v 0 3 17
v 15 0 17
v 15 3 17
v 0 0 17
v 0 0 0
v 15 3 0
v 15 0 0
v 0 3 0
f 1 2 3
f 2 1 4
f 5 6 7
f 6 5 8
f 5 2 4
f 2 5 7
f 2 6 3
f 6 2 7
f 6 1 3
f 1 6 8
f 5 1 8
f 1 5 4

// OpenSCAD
// Generated by SolidPython 1.0.1 on 2020-07-29 00:46:55


cube(size = [15, 3, 17]);
/***********************************************
*********      SolidPython code:      **********
************************************************
 
# import packages: SolidPython
from solid import *
from solid.utils import *
from itertools import chain, combinations, permutations


class Resize:

    def __init__(self, scad_file):
        self.scad_file = scad_file
        #self.scad_file = import_scad(scad_file)
        # cone/cylinder param:
        self.r1 = 0
        self.r2 = 0
        self.h = 0
        # rectangular prism param:
        self.w = 0
        self.l = 0
        # ellipse param:
        self.r = 0

    # import OpenScad code (file name corresponds to shape)


    # classify shape + parameters
    def assign(self, param1, param2, param3):
        if self.scad_file == 'cone.scad':
            self.r1 = param1
            self.r2 = param2
            self.h = param3
        elif self.scad_file == 'cylinder.scad':
            self.r1 = param1
            self.r2 = param2
            self.h = param3
        elif self.scad_file == 'rectangularPrism.scad':
            self.h = param1
            self.l = param2
            self.w = param3
        else:
            self.r = param1
            self.h = param2

    # resize parameters
    def iterate(self):
        x = range(3, 20, 2)
        i = 1
        if self.scad_file == 'cone.scad':
            tempList = list(permutations(x, 2))
            for temp in tempList:
                param1 = temp[0]
                param2 = temp[1]
                filepath = 'produced_scad_files/' + 'cone' + str(param1) + '_' + str(param2) + '_' + '.scad'
                scad_render_to_file(cylinder(h=param1, r1=param2, r2=0), filepath)

        elif self.scad_file == 'cylinder.scad':
            tempList = list(permutations(x, 3))
            for temp in tempList:
                param1 = temp[0]
                param2 = temp[1]
                filepath = 'produced_scad_files/' + 'cylinder' + str(param1) + '_' + str(param2) + '_' + '.scad'
                scad_render_to_file(cylinder(h=param1, r1=param2, r2=param2), filepath)

        elif self.scad_file == 'rectangularPrism.scad':
            tempList = list(permutations(x, 3))
            for temp in tempList:
                param1 = temp[0]
                param2 = temp[1]
                param3 = temp[2]
                filepath = 'produced_scad_files/' + 'rectangularPrism' + str(param1) + '_' + str(param2) + '_' + str(
                    param3) + '.scad'
                scad_render_to_file(cube(size=(param1, param2, param3)), filepath)

        elif self.scad_file == 'ellipse.scad':
            tempList = list(permutations(x, 4))
            for temp in tempList:
                param1 = temp[0]
                param2 = temp[1]
                param3 = temp[2]
                param4 = temp[3]
                filepath = 'produced_scad_files/' + 'ellipse' + str(param1) + '_' + str(param2) + '_' + str(param3) + '_' + str(param4) + '.scad'
                scad_render_to_file(scale([param1, param2, param3])(sphere(r=param4)), filepath)

    def render_to_scadfile(self):
        scad_render_to_file(scad, 'example.scad') 
 
************************************************/
